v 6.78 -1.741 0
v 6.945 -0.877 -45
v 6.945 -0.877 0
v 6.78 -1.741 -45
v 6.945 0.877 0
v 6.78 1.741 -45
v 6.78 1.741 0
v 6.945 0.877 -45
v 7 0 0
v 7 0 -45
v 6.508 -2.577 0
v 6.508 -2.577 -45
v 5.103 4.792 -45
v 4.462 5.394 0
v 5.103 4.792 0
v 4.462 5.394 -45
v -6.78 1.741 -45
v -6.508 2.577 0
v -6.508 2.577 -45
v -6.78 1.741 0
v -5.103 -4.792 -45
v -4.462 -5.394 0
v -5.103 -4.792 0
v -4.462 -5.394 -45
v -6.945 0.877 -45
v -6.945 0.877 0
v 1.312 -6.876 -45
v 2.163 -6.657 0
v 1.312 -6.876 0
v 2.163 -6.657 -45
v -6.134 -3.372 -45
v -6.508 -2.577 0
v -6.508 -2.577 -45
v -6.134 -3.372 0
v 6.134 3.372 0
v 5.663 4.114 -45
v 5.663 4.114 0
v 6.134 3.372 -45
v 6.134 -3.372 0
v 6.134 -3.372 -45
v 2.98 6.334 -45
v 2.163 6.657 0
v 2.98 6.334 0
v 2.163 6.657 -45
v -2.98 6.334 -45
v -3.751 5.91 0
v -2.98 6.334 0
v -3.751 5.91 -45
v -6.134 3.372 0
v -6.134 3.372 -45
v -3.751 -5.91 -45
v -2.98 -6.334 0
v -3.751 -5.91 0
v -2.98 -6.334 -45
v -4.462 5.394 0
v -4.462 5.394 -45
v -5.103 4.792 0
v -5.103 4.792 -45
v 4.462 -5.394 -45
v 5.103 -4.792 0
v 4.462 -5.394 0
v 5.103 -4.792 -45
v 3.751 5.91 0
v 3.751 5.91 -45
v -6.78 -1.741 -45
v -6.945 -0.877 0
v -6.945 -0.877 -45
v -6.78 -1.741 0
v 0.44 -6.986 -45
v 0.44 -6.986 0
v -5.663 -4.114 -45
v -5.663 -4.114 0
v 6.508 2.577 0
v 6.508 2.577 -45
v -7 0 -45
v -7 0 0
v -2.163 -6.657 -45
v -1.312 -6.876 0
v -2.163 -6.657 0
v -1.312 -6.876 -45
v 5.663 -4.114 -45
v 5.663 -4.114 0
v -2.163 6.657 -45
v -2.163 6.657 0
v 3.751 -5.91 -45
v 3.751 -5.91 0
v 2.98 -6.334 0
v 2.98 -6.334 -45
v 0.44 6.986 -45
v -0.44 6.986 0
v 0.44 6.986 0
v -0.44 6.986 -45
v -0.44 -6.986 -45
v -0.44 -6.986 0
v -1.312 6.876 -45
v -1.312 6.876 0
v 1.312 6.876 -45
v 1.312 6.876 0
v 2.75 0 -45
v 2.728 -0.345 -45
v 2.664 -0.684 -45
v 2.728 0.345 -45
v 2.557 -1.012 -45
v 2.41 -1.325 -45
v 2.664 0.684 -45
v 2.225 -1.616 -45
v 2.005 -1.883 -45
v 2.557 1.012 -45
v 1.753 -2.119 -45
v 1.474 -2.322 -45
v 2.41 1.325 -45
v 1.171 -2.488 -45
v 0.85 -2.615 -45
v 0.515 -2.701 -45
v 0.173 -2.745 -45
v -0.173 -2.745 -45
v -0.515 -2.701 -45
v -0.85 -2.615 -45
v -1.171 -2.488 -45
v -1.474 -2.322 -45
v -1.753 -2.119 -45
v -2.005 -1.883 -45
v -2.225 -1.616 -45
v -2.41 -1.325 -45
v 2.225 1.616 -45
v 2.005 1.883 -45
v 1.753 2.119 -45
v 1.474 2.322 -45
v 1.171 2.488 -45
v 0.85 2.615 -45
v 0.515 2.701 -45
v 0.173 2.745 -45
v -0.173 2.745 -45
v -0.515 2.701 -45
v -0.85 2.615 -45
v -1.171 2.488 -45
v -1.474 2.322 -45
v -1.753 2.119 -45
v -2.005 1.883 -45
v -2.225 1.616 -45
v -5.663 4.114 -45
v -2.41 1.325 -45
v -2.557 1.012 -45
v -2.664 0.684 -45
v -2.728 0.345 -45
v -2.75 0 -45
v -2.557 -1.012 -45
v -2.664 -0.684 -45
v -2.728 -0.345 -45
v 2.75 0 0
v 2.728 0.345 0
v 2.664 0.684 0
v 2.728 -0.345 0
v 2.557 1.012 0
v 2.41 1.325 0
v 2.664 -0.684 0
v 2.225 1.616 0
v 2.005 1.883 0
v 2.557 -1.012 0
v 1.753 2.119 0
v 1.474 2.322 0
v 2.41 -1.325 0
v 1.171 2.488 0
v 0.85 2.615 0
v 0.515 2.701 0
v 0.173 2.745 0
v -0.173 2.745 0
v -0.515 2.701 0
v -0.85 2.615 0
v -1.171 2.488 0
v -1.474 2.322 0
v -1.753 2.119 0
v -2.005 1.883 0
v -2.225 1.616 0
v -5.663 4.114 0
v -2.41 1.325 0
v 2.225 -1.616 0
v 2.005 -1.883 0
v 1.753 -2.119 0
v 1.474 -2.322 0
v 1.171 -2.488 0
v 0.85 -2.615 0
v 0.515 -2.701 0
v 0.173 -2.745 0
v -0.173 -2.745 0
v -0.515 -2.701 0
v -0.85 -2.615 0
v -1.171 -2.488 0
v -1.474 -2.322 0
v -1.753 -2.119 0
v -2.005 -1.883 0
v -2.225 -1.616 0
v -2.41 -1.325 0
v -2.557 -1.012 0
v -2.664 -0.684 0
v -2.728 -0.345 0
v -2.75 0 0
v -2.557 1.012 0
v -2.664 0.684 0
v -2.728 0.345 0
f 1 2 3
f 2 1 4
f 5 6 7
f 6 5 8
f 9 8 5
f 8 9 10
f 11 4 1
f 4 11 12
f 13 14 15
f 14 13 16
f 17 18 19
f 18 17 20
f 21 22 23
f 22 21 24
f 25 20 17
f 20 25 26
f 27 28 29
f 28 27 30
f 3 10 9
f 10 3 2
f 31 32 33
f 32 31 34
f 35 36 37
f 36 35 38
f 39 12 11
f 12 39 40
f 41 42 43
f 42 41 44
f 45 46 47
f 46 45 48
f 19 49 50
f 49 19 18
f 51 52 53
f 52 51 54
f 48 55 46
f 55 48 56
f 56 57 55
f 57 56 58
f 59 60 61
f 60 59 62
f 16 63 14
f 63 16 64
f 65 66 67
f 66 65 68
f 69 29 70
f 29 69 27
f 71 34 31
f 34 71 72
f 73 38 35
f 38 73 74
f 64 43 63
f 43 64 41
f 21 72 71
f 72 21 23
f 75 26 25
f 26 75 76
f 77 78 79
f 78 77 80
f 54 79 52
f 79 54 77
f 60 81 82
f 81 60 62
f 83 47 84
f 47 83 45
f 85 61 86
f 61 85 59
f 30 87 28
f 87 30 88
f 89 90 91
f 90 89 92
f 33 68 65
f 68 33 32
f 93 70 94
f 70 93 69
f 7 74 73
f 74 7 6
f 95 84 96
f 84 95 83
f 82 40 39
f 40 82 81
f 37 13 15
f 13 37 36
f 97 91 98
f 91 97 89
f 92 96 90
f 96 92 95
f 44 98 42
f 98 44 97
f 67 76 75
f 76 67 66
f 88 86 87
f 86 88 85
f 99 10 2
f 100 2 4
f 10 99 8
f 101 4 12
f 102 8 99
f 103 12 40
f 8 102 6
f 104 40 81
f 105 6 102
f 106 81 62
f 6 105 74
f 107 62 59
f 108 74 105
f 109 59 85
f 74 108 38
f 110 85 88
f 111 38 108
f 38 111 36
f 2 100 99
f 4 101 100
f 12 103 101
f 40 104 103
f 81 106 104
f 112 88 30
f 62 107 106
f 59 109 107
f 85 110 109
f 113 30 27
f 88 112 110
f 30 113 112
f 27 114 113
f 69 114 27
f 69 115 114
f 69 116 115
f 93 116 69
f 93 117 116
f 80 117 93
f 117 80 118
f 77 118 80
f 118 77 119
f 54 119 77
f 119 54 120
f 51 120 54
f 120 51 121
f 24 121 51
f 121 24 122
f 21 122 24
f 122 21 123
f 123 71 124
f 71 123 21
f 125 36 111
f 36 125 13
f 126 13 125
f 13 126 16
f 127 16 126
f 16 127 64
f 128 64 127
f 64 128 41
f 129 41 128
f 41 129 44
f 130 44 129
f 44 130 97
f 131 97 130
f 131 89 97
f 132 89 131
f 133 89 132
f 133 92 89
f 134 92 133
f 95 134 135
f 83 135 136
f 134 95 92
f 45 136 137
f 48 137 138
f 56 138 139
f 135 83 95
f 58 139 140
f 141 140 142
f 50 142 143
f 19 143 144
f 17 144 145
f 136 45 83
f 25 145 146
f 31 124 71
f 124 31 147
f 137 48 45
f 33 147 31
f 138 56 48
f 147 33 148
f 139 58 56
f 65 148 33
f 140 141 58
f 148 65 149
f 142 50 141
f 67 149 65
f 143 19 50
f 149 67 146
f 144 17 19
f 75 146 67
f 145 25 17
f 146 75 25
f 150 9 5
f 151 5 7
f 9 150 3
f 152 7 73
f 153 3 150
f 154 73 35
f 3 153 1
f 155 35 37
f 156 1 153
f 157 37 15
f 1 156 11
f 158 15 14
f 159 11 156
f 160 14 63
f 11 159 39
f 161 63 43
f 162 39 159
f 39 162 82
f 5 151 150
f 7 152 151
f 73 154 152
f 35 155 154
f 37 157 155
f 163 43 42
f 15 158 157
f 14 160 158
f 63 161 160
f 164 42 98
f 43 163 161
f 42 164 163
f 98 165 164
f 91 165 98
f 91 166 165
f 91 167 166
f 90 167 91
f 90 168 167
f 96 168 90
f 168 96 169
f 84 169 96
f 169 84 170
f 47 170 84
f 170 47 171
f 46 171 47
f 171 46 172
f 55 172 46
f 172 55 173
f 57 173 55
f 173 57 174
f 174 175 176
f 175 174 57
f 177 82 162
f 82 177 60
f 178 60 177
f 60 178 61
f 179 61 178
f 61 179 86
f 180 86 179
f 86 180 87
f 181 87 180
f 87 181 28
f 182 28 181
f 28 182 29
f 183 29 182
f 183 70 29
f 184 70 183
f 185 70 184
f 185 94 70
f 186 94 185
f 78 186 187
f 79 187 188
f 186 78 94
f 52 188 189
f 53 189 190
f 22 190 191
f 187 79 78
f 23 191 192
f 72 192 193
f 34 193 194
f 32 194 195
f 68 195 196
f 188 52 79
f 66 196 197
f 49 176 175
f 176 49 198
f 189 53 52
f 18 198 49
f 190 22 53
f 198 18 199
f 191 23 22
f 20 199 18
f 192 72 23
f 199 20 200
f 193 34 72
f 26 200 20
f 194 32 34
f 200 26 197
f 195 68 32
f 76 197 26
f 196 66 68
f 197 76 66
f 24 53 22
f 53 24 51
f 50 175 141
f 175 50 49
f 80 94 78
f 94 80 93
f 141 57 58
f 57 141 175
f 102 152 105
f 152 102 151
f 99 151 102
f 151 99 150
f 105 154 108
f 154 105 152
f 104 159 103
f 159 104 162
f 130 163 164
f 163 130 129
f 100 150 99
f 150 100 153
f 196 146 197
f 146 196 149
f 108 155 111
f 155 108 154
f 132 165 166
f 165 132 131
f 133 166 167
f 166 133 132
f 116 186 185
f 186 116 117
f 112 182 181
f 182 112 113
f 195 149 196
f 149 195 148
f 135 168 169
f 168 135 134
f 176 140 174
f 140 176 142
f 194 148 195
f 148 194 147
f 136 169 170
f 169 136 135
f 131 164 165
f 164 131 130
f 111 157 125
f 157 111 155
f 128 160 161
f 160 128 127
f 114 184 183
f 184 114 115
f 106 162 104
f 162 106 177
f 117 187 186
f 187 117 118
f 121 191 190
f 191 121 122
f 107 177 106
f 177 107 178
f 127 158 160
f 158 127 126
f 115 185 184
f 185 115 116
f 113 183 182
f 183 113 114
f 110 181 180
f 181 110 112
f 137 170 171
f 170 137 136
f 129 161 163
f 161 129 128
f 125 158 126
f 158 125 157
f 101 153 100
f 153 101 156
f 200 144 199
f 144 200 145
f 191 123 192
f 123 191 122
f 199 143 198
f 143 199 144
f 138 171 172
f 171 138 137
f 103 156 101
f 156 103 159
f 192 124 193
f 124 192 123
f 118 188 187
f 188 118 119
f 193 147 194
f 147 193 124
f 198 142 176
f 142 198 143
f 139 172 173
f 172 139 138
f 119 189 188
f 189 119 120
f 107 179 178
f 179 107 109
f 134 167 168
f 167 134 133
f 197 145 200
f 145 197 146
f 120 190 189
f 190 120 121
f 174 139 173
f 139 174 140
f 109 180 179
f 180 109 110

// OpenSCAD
$fn = 50;


difference() {
	union() {
		translate(v = [0, 0, -45.0000000000]) {
			cylinder(h = 45, r = 7.0000000000);
		}
		cylinder(h = 0, r = 17.0000000000);
	}
	union() {
		#translate(v = [0, 0, -45]) {
			cylinder(h = 45, r = 2.7500000000);
		}
	}
}
